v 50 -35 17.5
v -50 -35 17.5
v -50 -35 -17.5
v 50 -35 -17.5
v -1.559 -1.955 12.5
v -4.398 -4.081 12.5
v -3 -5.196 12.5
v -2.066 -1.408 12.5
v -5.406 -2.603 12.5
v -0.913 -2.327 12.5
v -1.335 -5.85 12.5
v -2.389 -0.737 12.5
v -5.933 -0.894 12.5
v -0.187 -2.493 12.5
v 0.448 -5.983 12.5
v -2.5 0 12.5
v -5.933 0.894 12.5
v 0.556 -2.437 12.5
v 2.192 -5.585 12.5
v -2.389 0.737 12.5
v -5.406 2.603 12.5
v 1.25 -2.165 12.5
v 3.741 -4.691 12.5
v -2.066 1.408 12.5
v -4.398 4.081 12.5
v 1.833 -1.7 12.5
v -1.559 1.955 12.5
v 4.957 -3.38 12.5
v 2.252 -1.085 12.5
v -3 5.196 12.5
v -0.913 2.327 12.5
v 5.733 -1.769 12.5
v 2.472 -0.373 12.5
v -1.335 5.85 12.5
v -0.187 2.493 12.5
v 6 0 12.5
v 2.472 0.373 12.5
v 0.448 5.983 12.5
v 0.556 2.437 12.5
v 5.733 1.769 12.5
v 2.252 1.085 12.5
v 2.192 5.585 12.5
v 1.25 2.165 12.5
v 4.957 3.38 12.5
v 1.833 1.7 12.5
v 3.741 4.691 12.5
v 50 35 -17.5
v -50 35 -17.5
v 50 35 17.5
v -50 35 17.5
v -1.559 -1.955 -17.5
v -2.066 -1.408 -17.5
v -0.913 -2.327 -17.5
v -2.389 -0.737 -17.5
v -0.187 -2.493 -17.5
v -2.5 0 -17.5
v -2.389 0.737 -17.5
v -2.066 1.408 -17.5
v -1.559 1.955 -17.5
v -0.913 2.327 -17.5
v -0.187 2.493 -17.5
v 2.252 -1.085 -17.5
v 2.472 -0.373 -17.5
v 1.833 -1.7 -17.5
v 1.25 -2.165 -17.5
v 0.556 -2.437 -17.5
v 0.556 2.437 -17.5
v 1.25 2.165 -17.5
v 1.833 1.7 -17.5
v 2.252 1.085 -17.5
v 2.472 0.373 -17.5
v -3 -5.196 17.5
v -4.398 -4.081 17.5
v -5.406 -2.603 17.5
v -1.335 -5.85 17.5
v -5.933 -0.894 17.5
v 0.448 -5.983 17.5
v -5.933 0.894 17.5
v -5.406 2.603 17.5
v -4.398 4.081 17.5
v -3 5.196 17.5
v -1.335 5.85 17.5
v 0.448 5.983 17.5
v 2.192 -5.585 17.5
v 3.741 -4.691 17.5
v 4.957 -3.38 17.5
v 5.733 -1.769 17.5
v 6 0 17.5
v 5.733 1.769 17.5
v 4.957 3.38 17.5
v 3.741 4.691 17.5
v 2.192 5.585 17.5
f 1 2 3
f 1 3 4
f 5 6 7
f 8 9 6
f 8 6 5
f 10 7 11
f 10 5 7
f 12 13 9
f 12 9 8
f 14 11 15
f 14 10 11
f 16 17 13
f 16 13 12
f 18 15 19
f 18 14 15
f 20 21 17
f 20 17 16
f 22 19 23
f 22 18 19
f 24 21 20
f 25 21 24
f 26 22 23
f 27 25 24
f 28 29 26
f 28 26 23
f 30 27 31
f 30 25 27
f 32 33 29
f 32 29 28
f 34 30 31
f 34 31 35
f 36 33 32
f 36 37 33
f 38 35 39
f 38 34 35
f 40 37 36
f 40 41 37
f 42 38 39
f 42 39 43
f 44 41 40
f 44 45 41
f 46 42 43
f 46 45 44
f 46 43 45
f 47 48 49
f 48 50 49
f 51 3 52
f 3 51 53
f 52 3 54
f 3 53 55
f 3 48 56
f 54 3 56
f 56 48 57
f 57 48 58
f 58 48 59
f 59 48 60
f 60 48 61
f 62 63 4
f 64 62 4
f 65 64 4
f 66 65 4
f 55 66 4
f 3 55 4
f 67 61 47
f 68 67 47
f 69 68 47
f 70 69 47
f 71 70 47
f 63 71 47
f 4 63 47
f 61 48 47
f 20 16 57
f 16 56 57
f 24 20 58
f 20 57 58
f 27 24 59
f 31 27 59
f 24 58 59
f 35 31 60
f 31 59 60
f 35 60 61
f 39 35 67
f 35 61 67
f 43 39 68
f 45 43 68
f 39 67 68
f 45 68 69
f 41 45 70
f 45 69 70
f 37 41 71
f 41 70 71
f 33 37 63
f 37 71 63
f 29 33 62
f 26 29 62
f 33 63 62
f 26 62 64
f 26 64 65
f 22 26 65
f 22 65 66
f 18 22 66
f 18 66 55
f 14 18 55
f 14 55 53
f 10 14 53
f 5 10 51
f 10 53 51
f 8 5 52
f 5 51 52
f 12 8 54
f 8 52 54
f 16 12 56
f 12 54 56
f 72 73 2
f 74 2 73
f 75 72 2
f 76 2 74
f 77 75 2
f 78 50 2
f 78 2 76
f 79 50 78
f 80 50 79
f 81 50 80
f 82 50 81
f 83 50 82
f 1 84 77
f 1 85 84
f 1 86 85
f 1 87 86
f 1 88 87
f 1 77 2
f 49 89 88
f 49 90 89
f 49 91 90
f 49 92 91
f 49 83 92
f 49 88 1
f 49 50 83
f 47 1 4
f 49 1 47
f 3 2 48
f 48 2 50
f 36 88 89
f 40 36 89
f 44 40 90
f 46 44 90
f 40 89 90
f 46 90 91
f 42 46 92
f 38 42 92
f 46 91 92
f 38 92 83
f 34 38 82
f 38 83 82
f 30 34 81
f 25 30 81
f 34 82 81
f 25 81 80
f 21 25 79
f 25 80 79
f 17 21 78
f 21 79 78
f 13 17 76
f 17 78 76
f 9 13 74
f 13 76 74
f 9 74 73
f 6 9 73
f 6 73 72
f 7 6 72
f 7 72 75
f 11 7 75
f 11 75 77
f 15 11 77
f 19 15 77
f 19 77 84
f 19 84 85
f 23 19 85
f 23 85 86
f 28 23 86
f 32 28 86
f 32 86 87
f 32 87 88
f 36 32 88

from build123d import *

# Parameters (mm, degrees)
F0_W           = 100
F0_H           = 70
F1_DEPTH       = 17.5
F3_D           = 5
F3_CBORE_D     = 12
F3_CBORE_DEPTH = 5


with BuildPart() as f1:
    # F0 (on Top) → F1 (new body, symmetric)
    with BuildSketch(Plane.XY):
        Rectangle(F0_W, F0_H)
    extrude(amount=F1_DEPTH, both=True)

    # F3 (through all)
    with Locations(Plane.XY.offset(17.5)):
        with Locations((0, 0)):
            CounterBoreHole(F3_D / 2, F3_CBORE_D / 2, F3_CBORE_DEPTH)


solid = f1.part
